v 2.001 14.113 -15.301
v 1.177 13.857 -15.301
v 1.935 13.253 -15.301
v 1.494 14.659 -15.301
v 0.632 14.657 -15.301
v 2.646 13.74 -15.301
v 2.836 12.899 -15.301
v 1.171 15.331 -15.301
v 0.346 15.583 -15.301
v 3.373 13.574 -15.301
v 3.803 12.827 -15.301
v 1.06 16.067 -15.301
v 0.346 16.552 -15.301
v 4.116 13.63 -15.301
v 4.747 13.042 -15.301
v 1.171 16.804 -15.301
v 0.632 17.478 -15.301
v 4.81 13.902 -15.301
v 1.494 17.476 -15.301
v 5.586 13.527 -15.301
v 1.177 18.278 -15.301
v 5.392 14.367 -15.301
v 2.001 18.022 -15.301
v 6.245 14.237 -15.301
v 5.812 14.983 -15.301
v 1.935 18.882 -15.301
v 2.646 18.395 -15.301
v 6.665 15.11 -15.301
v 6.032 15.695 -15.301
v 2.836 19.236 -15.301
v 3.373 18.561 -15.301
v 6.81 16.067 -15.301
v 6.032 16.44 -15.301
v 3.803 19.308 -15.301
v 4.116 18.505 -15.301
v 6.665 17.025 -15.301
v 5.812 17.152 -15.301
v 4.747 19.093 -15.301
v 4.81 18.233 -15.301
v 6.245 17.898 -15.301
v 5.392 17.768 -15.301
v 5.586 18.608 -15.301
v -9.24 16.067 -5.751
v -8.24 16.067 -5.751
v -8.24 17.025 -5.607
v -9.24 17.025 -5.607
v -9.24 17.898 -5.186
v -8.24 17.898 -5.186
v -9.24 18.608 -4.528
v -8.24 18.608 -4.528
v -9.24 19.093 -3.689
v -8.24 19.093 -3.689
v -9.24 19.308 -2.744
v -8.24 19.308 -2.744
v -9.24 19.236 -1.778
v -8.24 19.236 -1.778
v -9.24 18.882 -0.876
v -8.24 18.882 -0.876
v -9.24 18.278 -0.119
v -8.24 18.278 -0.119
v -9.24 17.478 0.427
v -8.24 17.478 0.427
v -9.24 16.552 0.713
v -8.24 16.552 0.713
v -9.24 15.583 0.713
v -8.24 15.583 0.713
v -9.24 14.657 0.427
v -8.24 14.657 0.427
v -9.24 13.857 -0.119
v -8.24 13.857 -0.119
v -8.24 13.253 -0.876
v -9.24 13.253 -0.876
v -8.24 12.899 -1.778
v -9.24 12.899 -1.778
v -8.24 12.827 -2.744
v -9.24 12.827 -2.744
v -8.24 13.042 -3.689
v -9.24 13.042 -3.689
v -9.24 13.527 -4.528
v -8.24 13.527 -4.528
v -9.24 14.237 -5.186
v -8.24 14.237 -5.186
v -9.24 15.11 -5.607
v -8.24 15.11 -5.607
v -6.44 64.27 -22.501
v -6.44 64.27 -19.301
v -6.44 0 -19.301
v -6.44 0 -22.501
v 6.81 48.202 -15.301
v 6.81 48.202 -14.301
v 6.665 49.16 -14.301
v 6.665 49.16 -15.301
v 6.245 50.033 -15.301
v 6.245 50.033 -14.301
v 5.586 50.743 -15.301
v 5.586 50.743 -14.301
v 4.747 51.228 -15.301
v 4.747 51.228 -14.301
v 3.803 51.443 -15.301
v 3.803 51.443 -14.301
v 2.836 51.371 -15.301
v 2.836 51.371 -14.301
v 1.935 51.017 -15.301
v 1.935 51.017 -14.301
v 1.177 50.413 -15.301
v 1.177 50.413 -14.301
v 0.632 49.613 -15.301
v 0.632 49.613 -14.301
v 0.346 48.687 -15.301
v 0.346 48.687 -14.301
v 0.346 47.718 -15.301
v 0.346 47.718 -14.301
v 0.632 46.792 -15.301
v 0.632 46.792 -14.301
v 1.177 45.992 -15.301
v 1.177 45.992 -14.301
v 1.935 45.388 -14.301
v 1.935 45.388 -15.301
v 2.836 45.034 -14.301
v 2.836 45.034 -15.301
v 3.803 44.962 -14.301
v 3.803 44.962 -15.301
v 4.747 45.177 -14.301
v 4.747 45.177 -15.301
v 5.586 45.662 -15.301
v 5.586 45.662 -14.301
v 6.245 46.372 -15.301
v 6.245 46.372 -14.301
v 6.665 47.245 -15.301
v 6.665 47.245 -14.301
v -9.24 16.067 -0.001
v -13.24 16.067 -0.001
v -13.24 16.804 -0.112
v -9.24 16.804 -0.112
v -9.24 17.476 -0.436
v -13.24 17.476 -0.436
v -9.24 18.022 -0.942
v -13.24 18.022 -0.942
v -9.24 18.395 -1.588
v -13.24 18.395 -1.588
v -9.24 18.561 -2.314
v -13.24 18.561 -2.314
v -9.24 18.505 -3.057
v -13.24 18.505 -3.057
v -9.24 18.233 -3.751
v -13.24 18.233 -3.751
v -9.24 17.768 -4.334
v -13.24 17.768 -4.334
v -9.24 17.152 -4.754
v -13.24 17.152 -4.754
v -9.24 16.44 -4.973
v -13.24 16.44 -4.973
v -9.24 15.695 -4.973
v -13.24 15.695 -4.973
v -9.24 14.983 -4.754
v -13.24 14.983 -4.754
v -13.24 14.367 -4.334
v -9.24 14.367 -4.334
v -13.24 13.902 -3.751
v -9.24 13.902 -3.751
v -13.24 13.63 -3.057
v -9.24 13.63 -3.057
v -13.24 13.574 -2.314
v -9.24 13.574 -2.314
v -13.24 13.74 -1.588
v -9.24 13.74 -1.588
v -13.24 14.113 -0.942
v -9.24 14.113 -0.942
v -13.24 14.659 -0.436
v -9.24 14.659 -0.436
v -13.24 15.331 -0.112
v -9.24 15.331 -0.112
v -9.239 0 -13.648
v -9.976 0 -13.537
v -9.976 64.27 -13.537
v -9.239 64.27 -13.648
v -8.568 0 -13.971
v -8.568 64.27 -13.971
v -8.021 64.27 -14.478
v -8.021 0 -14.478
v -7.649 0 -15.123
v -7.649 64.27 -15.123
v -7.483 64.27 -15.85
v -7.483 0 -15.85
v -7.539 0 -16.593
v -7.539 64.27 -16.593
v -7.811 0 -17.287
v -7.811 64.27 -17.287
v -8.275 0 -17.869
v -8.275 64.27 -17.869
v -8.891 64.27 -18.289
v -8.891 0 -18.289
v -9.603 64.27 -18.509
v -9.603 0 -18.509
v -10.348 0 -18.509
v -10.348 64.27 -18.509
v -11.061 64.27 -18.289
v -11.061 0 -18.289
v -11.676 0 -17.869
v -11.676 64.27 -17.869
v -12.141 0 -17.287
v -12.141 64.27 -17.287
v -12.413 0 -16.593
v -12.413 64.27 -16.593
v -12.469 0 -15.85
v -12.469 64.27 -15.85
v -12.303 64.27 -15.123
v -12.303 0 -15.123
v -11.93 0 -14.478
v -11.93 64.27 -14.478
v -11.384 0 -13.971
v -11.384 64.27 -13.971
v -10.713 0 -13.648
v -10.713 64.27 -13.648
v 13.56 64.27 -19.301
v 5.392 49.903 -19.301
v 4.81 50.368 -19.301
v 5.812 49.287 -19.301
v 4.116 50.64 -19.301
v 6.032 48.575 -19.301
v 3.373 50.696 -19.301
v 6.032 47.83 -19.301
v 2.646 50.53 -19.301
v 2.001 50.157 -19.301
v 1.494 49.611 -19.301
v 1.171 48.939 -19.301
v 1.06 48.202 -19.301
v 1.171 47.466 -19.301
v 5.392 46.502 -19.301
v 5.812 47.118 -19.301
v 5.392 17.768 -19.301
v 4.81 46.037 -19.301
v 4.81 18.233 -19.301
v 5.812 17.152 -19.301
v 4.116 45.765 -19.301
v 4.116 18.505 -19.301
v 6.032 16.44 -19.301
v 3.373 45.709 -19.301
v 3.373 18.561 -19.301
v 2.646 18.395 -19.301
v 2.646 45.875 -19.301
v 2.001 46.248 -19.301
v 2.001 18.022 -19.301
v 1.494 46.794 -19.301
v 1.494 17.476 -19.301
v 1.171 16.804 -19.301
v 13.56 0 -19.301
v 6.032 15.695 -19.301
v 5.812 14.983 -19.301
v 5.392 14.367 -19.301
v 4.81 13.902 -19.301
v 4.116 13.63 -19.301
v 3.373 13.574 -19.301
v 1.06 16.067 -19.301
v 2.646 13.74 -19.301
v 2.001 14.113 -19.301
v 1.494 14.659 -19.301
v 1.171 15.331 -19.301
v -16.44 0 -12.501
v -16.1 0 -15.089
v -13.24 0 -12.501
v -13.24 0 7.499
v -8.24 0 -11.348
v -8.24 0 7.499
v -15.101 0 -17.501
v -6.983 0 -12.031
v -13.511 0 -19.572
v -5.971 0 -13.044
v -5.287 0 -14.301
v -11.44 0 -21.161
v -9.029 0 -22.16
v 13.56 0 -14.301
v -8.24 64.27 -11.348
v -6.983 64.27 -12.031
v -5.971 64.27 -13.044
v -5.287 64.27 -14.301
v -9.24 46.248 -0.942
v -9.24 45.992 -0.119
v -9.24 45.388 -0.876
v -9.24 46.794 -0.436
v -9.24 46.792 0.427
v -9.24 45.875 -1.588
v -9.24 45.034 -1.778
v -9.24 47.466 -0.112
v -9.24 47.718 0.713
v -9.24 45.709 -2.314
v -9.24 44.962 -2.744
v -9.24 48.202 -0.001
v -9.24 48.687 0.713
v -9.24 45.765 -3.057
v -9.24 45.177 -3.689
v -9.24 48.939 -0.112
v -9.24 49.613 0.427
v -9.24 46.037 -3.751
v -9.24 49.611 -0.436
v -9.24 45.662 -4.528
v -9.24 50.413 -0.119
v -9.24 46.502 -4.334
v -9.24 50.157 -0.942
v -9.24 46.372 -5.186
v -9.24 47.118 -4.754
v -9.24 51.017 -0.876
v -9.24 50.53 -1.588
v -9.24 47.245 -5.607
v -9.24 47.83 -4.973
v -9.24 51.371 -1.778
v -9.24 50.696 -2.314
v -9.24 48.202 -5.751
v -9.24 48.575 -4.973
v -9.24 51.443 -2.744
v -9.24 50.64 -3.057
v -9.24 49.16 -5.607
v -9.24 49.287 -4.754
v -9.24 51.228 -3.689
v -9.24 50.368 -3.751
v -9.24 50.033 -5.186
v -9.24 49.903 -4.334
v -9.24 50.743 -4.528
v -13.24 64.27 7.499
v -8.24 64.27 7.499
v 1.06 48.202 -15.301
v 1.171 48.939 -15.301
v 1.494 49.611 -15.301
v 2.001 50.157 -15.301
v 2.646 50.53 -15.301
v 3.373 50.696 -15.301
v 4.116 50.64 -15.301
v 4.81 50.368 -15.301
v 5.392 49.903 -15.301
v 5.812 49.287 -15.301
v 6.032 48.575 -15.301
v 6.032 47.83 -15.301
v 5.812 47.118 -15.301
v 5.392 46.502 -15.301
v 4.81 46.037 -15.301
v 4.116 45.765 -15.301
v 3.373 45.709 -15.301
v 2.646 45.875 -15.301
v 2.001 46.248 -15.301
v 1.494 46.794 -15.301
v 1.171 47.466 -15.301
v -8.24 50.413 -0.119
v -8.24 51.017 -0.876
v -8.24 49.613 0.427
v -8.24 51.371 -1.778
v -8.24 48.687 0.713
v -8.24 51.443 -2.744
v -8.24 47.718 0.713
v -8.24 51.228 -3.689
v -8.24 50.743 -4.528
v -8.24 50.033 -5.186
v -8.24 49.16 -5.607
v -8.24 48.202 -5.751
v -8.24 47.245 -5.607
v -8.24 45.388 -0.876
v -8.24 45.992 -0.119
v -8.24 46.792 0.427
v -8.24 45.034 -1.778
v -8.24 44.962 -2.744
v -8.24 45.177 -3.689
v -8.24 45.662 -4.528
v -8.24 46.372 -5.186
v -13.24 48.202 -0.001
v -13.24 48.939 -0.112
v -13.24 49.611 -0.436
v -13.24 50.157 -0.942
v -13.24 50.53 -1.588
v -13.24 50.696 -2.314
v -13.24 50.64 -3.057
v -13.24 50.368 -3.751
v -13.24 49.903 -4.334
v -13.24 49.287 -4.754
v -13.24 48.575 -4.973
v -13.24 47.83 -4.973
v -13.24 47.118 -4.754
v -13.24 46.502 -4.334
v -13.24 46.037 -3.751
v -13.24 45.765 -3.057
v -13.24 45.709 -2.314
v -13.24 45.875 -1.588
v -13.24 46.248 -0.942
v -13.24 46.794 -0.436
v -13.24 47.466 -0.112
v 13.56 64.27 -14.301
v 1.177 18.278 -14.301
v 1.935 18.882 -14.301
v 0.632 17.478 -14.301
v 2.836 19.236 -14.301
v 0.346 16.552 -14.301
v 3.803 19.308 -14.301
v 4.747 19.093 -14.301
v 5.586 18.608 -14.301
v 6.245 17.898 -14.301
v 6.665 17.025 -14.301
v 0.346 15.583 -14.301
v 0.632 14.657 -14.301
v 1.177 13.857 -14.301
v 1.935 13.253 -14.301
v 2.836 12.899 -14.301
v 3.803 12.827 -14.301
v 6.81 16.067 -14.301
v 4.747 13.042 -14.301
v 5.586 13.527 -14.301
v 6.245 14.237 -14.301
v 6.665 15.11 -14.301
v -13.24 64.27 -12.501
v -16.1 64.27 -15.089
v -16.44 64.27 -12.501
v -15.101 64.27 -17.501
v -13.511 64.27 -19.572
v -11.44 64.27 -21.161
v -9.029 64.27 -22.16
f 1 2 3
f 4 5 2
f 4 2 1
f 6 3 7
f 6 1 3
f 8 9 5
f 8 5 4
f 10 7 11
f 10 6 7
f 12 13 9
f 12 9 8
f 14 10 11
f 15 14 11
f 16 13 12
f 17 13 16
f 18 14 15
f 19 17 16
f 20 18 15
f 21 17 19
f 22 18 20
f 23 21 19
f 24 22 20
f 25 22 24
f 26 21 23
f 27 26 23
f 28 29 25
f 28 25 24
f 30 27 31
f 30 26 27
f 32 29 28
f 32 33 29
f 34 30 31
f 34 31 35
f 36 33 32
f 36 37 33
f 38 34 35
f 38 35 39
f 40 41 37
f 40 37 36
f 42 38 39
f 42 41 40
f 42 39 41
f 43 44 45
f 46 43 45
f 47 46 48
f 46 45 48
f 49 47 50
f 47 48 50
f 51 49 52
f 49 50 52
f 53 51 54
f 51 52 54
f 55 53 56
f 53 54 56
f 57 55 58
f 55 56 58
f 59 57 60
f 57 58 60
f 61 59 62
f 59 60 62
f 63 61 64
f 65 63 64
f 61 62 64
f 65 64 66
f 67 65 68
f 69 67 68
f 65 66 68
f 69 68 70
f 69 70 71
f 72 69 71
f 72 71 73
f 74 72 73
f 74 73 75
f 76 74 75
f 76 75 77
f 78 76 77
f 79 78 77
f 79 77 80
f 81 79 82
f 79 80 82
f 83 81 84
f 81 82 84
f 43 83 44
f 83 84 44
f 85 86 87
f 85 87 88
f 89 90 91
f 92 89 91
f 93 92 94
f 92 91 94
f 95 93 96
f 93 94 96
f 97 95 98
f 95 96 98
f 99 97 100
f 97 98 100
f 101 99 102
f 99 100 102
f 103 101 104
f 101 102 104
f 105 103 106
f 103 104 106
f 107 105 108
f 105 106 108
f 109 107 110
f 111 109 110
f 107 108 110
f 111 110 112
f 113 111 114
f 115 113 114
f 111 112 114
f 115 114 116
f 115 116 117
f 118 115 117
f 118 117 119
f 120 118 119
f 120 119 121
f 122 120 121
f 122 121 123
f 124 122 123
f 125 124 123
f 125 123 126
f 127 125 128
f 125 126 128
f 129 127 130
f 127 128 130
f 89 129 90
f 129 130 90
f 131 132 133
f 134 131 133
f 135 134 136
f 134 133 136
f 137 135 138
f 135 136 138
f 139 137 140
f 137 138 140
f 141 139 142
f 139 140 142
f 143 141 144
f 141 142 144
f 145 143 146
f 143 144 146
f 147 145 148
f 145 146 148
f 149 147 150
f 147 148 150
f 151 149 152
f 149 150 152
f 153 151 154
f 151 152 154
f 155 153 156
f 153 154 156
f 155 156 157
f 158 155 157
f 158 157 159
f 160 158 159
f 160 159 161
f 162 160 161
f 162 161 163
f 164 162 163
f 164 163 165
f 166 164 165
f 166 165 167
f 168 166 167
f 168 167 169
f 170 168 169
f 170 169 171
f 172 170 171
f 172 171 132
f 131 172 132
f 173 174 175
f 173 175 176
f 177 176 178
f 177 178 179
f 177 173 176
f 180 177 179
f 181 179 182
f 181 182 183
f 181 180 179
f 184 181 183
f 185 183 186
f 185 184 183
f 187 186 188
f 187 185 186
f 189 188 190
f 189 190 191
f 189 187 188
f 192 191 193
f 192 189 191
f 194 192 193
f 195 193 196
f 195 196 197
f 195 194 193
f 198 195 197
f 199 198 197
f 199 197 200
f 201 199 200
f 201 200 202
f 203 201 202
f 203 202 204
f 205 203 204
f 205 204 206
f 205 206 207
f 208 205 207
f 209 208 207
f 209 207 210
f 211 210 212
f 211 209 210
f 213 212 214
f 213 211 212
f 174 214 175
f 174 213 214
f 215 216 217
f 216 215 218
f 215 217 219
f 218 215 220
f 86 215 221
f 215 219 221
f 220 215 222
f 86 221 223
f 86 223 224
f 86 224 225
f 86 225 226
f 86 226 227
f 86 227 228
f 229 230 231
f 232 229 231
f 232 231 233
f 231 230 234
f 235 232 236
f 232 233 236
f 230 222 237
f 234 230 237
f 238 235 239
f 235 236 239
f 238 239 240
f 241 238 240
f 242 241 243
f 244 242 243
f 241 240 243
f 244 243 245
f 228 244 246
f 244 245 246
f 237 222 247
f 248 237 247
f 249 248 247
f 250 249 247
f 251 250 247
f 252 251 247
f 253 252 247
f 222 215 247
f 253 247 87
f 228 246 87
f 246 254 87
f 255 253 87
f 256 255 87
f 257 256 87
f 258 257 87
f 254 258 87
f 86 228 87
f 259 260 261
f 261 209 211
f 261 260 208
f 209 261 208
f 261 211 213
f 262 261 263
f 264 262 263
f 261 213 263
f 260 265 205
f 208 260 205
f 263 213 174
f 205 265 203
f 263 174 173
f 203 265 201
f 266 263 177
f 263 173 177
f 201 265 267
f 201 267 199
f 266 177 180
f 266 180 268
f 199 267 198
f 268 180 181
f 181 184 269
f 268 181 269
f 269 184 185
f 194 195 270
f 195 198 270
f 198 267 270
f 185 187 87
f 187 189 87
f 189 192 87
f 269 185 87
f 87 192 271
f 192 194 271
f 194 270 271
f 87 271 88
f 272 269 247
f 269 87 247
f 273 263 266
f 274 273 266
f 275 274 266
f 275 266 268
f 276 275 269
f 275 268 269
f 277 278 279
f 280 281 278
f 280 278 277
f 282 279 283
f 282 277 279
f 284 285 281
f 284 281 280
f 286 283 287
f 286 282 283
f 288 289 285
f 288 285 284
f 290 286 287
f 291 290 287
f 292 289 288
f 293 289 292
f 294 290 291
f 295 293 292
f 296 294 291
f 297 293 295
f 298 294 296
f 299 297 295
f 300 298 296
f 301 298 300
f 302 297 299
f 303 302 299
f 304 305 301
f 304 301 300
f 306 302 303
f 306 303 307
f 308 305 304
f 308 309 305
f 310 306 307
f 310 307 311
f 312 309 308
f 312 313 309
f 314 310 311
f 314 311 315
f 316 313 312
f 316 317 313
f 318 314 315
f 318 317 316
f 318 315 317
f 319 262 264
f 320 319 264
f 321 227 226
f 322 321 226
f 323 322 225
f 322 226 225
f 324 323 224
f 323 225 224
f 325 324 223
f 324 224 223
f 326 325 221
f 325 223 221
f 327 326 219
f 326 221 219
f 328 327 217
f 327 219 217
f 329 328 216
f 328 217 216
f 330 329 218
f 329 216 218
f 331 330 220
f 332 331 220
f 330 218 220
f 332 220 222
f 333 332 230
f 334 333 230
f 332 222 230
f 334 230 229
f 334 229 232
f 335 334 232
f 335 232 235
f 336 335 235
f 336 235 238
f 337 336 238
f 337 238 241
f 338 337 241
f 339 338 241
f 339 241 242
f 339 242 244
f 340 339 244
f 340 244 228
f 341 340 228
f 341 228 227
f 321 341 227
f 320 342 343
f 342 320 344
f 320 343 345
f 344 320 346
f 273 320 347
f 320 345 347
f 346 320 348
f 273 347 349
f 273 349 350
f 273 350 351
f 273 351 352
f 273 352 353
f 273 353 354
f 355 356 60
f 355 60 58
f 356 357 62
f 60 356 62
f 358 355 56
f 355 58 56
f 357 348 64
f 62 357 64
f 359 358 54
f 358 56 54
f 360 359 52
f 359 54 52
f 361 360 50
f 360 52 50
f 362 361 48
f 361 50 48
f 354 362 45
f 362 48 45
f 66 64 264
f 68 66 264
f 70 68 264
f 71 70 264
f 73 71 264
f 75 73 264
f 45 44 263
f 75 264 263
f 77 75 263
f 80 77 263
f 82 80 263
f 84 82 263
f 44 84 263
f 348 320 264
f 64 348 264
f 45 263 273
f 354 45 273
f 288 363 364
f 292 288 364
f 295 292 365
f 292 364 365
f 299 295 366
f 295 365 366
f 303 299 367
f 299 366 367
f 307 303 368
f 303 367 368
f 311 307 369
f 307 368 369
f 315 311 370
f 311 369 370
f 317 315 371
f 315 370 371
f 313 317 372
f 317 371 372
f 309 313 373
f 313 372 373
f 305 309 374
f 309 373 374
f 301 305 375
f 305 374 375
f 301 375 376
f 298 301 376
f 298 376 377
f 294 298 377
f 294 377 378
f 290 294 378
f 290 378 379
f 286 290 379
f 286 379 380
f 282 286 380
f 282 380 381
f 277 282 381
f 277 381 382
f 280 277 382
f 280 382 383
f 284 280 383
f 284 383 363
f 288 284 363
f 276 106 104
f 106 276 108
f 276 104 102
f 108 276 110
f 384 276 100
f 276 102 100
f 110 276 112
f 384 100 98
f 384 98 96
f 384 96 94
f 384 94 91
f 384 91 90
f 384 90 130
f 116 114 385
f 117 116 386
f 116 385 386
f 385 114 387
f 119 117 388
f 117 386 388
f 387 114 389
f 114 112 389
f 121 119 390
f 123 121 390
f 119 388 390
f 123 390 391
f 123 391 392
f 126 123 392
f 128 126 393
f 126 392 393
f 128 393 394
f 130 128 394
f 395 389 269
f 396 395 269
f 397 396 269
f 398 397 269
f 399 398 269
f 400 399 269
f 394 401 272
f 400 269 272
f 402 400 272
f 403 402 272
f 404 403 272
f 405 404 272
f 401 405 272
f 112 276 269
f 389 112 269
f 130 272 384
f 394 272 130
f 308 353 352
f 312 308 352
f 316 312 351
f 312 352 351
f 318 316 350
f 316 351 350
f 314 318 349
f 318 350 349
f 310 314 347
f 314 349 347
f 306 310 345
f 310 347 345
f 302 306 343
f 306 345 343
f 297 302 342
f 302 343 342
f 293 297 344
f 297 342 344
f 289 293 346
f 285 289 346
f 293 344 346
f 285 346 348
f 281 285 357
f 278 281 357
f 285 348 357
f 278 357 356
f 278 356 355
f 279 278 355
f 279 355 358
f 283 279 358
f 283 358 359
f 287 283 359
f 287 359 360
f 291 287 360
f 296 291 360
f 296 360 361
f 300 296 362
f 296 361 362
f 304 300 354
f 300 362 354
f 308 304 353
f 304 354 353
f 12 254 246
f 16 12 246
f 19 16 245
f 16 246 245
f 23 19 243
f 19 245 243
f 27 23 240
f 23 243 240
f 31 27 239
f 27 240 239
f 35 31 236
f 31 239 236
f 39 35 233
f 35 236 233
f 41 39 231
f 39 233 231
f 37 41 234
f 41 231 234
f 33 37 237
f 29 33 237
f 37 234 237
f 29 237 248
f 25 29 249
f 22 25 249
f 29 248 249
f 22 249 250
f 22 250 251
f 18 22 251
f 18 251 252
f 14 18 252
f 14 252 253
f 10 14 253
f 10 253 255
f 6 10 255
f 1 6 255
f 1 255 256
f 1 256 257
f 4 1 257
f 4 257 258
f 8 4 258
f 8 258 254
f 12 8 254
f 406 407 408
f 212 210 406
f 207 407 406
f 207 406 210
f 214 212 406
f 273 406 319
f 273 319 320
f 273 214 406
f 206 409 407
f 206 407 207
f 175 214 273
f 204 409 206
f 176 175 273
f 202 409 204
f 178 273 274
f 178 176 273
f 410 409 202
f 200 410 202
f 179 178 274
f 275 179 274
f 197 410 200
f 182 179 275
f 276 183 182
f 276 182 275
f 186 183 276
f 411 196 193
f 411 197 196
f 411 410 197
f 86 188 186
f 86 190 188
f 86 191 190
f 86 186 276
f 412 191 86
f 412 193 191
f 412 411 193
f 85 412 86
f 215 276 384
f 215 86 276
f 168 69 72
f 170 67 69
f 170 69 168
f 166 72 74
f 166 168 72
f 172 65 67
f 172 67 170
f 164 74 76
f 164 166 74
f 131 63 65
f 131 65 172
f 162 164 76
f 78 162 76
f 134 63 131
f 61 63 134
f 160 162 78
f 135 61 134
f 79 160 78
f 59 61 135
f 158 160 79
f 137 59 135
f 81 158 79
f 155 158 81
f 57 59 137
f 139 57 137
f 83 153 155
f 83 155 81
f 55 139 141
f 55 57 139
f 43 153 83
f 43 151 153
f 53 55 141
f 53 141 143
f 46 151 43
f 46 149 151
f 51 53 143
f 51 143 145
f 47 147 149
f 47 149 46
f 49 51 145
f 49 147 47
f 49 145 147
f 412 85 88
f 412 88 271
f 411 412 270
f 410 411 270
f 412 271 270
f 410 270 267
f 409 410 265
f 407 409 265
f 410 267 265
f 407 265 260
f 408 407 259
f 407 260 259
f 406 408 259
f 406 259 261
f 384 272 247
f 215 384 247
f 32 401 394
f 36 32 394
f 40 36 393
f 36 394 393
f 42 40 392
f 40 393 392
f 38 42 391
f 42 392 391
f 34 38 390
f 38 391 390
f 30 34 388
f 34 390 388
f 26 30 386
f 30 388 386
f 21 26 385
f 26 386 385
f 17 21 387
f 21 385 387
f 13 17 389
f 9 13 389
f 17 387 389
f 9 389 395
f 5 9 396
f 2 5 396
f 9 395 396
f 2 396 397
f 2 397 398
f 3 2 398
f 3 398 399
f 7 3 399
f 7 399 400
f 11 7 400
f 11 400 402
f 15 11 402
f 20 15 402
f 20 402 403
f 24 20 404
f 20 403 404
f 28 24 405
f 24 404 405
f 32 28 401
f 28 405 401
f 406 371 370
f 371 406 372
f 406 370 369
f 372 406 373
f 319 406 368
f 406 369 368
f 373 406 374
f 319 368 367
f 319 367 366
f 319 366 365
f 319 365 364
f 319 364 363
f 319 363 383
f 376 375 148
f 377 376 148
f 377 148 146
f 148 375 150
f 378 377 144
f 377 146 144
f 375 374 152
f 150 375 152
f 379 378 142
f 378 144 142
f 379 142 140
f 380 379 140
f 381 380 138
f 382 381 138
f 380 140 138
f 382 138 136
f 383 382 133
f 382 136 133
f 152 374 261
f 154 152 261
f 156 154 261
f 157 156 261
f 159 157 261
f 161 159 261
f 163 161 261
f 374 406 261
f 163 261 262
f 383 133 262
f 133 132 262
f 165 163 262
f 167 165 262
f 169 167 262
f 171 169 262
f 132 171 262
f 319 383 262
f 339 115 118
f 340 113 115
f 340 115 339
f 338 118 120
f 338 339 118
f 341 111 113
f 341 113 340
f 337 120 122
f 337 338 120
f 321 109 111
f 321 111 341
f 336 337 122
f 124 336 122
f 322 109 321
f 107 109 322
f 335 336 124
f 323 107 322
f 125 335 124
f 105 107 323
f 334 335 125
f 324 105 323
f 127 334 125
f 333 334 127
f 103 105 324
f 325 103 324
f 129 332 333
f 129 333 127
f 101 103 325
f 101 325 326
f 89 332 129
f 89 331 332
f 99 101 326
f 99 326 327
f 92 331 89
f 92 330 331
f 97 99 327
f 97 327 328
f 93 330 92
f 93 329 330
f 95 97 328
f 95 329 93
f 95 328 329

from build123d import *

# Parameters (mm, degrees)
SKETCH4_R           = 2.5
BOSS_EXTRUDE1_DEPTH = 64.27
SKETCH5_R           = 2.5
CUT_EXTRUDE1_DEPTH  = 72.548291037
SKETCH6_R           = 2.5
CUT_EXTRUDE2_DEPTH  = 74.179063133
SKETCH7_R           = 3.25
CUT_EXTRUDE3_DEPTH  = 1
SKETCH8_R           = 3.25
CUT_EXTRUDE4_DEPTH  = 1


with BuildPart() as part:
    # Sketch4 → Boss-Extrude1 (new body)
    with BuildSketch(Plane(origin=(0, 0, 0), x_dir=(1, 0, 0), z_dir=(0, 1, 0))):
        with BuildLine():
            Line((-5.286754077, 14.301163994), (13.559651759, 14.301163994))
            Line((13.559651759, 14.301163994), (13.559651759, 19.301163994))
            Line((13.559651759, 19.301163994), (-6.440348241, 19.301163994))
            Line((-6.440348241, 19.301163994), (-6.440348241, 22.501163994))
            ThreePointArc((-6.440348241, 22.501163994), (-13.511416053, 19.572231806), (-16.440348241, 12.501163994))
            Line((-16.440348241, 12.501163994), (-13.240348241, 12.501163994))
            Line((-13.240348241, 12.501163994), (-13.240348241, -7.498836006))
            Line((-13.240348241, -7.498836006), (-8.240348241, -7.498836006))
            Line((-8.240348241, -7.498836006), (-8.240348241, 11.347569829))
            ThreePointArc((-8.240348241, 11.347569829), (-6.440348241, 12.501163994), (-5.286754077, 14.301163994))
        make_face()
        with Locations(Location((-9.975882147, 16.0366979, 0), (0, 0, 270))):
            Circle(SKETCH4_R, mode=Mode.SUBTRACT)
    extrude(amount=BOSS_EXTRUDE1_DEPTH)

    # Sketch5 → Cut-Extrude1 (cut, through all)
    with BuildSketch(Plane(origin=(0, 0, -19.301163994), x_dir=(-1, 0, 0), z_dir=(0, 0, -1))):
        with Locations((-3.559651759, 48.2025)):
            Circle(SKETCH5_R)
        with Locations((-3.559651759, 16.0675)):
            Circle(SKETCH5_R)
    extrude(amount=-CUT_EXTRUDE1_DEPTH, mode=Mode.SUBTRACT)

    # Sketch6 → Cut-Extrude2 (cut, through all)
    with BuildSketch(Plane.ZY.offset(13.240348241)):
        with Locations((-2.501163994, 48.2025)):
            Circle(SKETCH6_R)
        with Locations((-2.501163994, 16.0675)):
            Circle(SKETCH6_R)
    extrude(amount=-CUT_EXTRUDE2_DEPTH, mode=Mode.SUBTRACT)

    # Sketch7 → Cut-Extrude3 (cut)
    with BuildSketch(Plane(origin=(-8.240348241, 0, 0), x_dir=(0, 0, -1), z_dir=(1, 0, 0))):
        with Locations((2.501163994, 48.2025)):
            Circle(SKETCH7_R)
        with Locations((2.501163994, 16.0675)):
            Circle(SKETCH7_R)
    extrude(amount=-CUT_EXTRUDE3_DEPTH, mode=Mode.SUBTRACT)

    # Sketch8 → Cut-Extrude4 (cut)
    with BuildSketch(Plane.XY.offset(-14.301163994)):
        with Locations((3.559651759, 48.2025)):
            Circle(SKETCH8_R)
        with Locations((3.559651759, 16.0675)):
            Circle(SKETCH8_R)
    extrude(amount=-CUT_EXTRUDE4_DEPTH, mode=Mode.SUBTRACT)


solid = part.part
